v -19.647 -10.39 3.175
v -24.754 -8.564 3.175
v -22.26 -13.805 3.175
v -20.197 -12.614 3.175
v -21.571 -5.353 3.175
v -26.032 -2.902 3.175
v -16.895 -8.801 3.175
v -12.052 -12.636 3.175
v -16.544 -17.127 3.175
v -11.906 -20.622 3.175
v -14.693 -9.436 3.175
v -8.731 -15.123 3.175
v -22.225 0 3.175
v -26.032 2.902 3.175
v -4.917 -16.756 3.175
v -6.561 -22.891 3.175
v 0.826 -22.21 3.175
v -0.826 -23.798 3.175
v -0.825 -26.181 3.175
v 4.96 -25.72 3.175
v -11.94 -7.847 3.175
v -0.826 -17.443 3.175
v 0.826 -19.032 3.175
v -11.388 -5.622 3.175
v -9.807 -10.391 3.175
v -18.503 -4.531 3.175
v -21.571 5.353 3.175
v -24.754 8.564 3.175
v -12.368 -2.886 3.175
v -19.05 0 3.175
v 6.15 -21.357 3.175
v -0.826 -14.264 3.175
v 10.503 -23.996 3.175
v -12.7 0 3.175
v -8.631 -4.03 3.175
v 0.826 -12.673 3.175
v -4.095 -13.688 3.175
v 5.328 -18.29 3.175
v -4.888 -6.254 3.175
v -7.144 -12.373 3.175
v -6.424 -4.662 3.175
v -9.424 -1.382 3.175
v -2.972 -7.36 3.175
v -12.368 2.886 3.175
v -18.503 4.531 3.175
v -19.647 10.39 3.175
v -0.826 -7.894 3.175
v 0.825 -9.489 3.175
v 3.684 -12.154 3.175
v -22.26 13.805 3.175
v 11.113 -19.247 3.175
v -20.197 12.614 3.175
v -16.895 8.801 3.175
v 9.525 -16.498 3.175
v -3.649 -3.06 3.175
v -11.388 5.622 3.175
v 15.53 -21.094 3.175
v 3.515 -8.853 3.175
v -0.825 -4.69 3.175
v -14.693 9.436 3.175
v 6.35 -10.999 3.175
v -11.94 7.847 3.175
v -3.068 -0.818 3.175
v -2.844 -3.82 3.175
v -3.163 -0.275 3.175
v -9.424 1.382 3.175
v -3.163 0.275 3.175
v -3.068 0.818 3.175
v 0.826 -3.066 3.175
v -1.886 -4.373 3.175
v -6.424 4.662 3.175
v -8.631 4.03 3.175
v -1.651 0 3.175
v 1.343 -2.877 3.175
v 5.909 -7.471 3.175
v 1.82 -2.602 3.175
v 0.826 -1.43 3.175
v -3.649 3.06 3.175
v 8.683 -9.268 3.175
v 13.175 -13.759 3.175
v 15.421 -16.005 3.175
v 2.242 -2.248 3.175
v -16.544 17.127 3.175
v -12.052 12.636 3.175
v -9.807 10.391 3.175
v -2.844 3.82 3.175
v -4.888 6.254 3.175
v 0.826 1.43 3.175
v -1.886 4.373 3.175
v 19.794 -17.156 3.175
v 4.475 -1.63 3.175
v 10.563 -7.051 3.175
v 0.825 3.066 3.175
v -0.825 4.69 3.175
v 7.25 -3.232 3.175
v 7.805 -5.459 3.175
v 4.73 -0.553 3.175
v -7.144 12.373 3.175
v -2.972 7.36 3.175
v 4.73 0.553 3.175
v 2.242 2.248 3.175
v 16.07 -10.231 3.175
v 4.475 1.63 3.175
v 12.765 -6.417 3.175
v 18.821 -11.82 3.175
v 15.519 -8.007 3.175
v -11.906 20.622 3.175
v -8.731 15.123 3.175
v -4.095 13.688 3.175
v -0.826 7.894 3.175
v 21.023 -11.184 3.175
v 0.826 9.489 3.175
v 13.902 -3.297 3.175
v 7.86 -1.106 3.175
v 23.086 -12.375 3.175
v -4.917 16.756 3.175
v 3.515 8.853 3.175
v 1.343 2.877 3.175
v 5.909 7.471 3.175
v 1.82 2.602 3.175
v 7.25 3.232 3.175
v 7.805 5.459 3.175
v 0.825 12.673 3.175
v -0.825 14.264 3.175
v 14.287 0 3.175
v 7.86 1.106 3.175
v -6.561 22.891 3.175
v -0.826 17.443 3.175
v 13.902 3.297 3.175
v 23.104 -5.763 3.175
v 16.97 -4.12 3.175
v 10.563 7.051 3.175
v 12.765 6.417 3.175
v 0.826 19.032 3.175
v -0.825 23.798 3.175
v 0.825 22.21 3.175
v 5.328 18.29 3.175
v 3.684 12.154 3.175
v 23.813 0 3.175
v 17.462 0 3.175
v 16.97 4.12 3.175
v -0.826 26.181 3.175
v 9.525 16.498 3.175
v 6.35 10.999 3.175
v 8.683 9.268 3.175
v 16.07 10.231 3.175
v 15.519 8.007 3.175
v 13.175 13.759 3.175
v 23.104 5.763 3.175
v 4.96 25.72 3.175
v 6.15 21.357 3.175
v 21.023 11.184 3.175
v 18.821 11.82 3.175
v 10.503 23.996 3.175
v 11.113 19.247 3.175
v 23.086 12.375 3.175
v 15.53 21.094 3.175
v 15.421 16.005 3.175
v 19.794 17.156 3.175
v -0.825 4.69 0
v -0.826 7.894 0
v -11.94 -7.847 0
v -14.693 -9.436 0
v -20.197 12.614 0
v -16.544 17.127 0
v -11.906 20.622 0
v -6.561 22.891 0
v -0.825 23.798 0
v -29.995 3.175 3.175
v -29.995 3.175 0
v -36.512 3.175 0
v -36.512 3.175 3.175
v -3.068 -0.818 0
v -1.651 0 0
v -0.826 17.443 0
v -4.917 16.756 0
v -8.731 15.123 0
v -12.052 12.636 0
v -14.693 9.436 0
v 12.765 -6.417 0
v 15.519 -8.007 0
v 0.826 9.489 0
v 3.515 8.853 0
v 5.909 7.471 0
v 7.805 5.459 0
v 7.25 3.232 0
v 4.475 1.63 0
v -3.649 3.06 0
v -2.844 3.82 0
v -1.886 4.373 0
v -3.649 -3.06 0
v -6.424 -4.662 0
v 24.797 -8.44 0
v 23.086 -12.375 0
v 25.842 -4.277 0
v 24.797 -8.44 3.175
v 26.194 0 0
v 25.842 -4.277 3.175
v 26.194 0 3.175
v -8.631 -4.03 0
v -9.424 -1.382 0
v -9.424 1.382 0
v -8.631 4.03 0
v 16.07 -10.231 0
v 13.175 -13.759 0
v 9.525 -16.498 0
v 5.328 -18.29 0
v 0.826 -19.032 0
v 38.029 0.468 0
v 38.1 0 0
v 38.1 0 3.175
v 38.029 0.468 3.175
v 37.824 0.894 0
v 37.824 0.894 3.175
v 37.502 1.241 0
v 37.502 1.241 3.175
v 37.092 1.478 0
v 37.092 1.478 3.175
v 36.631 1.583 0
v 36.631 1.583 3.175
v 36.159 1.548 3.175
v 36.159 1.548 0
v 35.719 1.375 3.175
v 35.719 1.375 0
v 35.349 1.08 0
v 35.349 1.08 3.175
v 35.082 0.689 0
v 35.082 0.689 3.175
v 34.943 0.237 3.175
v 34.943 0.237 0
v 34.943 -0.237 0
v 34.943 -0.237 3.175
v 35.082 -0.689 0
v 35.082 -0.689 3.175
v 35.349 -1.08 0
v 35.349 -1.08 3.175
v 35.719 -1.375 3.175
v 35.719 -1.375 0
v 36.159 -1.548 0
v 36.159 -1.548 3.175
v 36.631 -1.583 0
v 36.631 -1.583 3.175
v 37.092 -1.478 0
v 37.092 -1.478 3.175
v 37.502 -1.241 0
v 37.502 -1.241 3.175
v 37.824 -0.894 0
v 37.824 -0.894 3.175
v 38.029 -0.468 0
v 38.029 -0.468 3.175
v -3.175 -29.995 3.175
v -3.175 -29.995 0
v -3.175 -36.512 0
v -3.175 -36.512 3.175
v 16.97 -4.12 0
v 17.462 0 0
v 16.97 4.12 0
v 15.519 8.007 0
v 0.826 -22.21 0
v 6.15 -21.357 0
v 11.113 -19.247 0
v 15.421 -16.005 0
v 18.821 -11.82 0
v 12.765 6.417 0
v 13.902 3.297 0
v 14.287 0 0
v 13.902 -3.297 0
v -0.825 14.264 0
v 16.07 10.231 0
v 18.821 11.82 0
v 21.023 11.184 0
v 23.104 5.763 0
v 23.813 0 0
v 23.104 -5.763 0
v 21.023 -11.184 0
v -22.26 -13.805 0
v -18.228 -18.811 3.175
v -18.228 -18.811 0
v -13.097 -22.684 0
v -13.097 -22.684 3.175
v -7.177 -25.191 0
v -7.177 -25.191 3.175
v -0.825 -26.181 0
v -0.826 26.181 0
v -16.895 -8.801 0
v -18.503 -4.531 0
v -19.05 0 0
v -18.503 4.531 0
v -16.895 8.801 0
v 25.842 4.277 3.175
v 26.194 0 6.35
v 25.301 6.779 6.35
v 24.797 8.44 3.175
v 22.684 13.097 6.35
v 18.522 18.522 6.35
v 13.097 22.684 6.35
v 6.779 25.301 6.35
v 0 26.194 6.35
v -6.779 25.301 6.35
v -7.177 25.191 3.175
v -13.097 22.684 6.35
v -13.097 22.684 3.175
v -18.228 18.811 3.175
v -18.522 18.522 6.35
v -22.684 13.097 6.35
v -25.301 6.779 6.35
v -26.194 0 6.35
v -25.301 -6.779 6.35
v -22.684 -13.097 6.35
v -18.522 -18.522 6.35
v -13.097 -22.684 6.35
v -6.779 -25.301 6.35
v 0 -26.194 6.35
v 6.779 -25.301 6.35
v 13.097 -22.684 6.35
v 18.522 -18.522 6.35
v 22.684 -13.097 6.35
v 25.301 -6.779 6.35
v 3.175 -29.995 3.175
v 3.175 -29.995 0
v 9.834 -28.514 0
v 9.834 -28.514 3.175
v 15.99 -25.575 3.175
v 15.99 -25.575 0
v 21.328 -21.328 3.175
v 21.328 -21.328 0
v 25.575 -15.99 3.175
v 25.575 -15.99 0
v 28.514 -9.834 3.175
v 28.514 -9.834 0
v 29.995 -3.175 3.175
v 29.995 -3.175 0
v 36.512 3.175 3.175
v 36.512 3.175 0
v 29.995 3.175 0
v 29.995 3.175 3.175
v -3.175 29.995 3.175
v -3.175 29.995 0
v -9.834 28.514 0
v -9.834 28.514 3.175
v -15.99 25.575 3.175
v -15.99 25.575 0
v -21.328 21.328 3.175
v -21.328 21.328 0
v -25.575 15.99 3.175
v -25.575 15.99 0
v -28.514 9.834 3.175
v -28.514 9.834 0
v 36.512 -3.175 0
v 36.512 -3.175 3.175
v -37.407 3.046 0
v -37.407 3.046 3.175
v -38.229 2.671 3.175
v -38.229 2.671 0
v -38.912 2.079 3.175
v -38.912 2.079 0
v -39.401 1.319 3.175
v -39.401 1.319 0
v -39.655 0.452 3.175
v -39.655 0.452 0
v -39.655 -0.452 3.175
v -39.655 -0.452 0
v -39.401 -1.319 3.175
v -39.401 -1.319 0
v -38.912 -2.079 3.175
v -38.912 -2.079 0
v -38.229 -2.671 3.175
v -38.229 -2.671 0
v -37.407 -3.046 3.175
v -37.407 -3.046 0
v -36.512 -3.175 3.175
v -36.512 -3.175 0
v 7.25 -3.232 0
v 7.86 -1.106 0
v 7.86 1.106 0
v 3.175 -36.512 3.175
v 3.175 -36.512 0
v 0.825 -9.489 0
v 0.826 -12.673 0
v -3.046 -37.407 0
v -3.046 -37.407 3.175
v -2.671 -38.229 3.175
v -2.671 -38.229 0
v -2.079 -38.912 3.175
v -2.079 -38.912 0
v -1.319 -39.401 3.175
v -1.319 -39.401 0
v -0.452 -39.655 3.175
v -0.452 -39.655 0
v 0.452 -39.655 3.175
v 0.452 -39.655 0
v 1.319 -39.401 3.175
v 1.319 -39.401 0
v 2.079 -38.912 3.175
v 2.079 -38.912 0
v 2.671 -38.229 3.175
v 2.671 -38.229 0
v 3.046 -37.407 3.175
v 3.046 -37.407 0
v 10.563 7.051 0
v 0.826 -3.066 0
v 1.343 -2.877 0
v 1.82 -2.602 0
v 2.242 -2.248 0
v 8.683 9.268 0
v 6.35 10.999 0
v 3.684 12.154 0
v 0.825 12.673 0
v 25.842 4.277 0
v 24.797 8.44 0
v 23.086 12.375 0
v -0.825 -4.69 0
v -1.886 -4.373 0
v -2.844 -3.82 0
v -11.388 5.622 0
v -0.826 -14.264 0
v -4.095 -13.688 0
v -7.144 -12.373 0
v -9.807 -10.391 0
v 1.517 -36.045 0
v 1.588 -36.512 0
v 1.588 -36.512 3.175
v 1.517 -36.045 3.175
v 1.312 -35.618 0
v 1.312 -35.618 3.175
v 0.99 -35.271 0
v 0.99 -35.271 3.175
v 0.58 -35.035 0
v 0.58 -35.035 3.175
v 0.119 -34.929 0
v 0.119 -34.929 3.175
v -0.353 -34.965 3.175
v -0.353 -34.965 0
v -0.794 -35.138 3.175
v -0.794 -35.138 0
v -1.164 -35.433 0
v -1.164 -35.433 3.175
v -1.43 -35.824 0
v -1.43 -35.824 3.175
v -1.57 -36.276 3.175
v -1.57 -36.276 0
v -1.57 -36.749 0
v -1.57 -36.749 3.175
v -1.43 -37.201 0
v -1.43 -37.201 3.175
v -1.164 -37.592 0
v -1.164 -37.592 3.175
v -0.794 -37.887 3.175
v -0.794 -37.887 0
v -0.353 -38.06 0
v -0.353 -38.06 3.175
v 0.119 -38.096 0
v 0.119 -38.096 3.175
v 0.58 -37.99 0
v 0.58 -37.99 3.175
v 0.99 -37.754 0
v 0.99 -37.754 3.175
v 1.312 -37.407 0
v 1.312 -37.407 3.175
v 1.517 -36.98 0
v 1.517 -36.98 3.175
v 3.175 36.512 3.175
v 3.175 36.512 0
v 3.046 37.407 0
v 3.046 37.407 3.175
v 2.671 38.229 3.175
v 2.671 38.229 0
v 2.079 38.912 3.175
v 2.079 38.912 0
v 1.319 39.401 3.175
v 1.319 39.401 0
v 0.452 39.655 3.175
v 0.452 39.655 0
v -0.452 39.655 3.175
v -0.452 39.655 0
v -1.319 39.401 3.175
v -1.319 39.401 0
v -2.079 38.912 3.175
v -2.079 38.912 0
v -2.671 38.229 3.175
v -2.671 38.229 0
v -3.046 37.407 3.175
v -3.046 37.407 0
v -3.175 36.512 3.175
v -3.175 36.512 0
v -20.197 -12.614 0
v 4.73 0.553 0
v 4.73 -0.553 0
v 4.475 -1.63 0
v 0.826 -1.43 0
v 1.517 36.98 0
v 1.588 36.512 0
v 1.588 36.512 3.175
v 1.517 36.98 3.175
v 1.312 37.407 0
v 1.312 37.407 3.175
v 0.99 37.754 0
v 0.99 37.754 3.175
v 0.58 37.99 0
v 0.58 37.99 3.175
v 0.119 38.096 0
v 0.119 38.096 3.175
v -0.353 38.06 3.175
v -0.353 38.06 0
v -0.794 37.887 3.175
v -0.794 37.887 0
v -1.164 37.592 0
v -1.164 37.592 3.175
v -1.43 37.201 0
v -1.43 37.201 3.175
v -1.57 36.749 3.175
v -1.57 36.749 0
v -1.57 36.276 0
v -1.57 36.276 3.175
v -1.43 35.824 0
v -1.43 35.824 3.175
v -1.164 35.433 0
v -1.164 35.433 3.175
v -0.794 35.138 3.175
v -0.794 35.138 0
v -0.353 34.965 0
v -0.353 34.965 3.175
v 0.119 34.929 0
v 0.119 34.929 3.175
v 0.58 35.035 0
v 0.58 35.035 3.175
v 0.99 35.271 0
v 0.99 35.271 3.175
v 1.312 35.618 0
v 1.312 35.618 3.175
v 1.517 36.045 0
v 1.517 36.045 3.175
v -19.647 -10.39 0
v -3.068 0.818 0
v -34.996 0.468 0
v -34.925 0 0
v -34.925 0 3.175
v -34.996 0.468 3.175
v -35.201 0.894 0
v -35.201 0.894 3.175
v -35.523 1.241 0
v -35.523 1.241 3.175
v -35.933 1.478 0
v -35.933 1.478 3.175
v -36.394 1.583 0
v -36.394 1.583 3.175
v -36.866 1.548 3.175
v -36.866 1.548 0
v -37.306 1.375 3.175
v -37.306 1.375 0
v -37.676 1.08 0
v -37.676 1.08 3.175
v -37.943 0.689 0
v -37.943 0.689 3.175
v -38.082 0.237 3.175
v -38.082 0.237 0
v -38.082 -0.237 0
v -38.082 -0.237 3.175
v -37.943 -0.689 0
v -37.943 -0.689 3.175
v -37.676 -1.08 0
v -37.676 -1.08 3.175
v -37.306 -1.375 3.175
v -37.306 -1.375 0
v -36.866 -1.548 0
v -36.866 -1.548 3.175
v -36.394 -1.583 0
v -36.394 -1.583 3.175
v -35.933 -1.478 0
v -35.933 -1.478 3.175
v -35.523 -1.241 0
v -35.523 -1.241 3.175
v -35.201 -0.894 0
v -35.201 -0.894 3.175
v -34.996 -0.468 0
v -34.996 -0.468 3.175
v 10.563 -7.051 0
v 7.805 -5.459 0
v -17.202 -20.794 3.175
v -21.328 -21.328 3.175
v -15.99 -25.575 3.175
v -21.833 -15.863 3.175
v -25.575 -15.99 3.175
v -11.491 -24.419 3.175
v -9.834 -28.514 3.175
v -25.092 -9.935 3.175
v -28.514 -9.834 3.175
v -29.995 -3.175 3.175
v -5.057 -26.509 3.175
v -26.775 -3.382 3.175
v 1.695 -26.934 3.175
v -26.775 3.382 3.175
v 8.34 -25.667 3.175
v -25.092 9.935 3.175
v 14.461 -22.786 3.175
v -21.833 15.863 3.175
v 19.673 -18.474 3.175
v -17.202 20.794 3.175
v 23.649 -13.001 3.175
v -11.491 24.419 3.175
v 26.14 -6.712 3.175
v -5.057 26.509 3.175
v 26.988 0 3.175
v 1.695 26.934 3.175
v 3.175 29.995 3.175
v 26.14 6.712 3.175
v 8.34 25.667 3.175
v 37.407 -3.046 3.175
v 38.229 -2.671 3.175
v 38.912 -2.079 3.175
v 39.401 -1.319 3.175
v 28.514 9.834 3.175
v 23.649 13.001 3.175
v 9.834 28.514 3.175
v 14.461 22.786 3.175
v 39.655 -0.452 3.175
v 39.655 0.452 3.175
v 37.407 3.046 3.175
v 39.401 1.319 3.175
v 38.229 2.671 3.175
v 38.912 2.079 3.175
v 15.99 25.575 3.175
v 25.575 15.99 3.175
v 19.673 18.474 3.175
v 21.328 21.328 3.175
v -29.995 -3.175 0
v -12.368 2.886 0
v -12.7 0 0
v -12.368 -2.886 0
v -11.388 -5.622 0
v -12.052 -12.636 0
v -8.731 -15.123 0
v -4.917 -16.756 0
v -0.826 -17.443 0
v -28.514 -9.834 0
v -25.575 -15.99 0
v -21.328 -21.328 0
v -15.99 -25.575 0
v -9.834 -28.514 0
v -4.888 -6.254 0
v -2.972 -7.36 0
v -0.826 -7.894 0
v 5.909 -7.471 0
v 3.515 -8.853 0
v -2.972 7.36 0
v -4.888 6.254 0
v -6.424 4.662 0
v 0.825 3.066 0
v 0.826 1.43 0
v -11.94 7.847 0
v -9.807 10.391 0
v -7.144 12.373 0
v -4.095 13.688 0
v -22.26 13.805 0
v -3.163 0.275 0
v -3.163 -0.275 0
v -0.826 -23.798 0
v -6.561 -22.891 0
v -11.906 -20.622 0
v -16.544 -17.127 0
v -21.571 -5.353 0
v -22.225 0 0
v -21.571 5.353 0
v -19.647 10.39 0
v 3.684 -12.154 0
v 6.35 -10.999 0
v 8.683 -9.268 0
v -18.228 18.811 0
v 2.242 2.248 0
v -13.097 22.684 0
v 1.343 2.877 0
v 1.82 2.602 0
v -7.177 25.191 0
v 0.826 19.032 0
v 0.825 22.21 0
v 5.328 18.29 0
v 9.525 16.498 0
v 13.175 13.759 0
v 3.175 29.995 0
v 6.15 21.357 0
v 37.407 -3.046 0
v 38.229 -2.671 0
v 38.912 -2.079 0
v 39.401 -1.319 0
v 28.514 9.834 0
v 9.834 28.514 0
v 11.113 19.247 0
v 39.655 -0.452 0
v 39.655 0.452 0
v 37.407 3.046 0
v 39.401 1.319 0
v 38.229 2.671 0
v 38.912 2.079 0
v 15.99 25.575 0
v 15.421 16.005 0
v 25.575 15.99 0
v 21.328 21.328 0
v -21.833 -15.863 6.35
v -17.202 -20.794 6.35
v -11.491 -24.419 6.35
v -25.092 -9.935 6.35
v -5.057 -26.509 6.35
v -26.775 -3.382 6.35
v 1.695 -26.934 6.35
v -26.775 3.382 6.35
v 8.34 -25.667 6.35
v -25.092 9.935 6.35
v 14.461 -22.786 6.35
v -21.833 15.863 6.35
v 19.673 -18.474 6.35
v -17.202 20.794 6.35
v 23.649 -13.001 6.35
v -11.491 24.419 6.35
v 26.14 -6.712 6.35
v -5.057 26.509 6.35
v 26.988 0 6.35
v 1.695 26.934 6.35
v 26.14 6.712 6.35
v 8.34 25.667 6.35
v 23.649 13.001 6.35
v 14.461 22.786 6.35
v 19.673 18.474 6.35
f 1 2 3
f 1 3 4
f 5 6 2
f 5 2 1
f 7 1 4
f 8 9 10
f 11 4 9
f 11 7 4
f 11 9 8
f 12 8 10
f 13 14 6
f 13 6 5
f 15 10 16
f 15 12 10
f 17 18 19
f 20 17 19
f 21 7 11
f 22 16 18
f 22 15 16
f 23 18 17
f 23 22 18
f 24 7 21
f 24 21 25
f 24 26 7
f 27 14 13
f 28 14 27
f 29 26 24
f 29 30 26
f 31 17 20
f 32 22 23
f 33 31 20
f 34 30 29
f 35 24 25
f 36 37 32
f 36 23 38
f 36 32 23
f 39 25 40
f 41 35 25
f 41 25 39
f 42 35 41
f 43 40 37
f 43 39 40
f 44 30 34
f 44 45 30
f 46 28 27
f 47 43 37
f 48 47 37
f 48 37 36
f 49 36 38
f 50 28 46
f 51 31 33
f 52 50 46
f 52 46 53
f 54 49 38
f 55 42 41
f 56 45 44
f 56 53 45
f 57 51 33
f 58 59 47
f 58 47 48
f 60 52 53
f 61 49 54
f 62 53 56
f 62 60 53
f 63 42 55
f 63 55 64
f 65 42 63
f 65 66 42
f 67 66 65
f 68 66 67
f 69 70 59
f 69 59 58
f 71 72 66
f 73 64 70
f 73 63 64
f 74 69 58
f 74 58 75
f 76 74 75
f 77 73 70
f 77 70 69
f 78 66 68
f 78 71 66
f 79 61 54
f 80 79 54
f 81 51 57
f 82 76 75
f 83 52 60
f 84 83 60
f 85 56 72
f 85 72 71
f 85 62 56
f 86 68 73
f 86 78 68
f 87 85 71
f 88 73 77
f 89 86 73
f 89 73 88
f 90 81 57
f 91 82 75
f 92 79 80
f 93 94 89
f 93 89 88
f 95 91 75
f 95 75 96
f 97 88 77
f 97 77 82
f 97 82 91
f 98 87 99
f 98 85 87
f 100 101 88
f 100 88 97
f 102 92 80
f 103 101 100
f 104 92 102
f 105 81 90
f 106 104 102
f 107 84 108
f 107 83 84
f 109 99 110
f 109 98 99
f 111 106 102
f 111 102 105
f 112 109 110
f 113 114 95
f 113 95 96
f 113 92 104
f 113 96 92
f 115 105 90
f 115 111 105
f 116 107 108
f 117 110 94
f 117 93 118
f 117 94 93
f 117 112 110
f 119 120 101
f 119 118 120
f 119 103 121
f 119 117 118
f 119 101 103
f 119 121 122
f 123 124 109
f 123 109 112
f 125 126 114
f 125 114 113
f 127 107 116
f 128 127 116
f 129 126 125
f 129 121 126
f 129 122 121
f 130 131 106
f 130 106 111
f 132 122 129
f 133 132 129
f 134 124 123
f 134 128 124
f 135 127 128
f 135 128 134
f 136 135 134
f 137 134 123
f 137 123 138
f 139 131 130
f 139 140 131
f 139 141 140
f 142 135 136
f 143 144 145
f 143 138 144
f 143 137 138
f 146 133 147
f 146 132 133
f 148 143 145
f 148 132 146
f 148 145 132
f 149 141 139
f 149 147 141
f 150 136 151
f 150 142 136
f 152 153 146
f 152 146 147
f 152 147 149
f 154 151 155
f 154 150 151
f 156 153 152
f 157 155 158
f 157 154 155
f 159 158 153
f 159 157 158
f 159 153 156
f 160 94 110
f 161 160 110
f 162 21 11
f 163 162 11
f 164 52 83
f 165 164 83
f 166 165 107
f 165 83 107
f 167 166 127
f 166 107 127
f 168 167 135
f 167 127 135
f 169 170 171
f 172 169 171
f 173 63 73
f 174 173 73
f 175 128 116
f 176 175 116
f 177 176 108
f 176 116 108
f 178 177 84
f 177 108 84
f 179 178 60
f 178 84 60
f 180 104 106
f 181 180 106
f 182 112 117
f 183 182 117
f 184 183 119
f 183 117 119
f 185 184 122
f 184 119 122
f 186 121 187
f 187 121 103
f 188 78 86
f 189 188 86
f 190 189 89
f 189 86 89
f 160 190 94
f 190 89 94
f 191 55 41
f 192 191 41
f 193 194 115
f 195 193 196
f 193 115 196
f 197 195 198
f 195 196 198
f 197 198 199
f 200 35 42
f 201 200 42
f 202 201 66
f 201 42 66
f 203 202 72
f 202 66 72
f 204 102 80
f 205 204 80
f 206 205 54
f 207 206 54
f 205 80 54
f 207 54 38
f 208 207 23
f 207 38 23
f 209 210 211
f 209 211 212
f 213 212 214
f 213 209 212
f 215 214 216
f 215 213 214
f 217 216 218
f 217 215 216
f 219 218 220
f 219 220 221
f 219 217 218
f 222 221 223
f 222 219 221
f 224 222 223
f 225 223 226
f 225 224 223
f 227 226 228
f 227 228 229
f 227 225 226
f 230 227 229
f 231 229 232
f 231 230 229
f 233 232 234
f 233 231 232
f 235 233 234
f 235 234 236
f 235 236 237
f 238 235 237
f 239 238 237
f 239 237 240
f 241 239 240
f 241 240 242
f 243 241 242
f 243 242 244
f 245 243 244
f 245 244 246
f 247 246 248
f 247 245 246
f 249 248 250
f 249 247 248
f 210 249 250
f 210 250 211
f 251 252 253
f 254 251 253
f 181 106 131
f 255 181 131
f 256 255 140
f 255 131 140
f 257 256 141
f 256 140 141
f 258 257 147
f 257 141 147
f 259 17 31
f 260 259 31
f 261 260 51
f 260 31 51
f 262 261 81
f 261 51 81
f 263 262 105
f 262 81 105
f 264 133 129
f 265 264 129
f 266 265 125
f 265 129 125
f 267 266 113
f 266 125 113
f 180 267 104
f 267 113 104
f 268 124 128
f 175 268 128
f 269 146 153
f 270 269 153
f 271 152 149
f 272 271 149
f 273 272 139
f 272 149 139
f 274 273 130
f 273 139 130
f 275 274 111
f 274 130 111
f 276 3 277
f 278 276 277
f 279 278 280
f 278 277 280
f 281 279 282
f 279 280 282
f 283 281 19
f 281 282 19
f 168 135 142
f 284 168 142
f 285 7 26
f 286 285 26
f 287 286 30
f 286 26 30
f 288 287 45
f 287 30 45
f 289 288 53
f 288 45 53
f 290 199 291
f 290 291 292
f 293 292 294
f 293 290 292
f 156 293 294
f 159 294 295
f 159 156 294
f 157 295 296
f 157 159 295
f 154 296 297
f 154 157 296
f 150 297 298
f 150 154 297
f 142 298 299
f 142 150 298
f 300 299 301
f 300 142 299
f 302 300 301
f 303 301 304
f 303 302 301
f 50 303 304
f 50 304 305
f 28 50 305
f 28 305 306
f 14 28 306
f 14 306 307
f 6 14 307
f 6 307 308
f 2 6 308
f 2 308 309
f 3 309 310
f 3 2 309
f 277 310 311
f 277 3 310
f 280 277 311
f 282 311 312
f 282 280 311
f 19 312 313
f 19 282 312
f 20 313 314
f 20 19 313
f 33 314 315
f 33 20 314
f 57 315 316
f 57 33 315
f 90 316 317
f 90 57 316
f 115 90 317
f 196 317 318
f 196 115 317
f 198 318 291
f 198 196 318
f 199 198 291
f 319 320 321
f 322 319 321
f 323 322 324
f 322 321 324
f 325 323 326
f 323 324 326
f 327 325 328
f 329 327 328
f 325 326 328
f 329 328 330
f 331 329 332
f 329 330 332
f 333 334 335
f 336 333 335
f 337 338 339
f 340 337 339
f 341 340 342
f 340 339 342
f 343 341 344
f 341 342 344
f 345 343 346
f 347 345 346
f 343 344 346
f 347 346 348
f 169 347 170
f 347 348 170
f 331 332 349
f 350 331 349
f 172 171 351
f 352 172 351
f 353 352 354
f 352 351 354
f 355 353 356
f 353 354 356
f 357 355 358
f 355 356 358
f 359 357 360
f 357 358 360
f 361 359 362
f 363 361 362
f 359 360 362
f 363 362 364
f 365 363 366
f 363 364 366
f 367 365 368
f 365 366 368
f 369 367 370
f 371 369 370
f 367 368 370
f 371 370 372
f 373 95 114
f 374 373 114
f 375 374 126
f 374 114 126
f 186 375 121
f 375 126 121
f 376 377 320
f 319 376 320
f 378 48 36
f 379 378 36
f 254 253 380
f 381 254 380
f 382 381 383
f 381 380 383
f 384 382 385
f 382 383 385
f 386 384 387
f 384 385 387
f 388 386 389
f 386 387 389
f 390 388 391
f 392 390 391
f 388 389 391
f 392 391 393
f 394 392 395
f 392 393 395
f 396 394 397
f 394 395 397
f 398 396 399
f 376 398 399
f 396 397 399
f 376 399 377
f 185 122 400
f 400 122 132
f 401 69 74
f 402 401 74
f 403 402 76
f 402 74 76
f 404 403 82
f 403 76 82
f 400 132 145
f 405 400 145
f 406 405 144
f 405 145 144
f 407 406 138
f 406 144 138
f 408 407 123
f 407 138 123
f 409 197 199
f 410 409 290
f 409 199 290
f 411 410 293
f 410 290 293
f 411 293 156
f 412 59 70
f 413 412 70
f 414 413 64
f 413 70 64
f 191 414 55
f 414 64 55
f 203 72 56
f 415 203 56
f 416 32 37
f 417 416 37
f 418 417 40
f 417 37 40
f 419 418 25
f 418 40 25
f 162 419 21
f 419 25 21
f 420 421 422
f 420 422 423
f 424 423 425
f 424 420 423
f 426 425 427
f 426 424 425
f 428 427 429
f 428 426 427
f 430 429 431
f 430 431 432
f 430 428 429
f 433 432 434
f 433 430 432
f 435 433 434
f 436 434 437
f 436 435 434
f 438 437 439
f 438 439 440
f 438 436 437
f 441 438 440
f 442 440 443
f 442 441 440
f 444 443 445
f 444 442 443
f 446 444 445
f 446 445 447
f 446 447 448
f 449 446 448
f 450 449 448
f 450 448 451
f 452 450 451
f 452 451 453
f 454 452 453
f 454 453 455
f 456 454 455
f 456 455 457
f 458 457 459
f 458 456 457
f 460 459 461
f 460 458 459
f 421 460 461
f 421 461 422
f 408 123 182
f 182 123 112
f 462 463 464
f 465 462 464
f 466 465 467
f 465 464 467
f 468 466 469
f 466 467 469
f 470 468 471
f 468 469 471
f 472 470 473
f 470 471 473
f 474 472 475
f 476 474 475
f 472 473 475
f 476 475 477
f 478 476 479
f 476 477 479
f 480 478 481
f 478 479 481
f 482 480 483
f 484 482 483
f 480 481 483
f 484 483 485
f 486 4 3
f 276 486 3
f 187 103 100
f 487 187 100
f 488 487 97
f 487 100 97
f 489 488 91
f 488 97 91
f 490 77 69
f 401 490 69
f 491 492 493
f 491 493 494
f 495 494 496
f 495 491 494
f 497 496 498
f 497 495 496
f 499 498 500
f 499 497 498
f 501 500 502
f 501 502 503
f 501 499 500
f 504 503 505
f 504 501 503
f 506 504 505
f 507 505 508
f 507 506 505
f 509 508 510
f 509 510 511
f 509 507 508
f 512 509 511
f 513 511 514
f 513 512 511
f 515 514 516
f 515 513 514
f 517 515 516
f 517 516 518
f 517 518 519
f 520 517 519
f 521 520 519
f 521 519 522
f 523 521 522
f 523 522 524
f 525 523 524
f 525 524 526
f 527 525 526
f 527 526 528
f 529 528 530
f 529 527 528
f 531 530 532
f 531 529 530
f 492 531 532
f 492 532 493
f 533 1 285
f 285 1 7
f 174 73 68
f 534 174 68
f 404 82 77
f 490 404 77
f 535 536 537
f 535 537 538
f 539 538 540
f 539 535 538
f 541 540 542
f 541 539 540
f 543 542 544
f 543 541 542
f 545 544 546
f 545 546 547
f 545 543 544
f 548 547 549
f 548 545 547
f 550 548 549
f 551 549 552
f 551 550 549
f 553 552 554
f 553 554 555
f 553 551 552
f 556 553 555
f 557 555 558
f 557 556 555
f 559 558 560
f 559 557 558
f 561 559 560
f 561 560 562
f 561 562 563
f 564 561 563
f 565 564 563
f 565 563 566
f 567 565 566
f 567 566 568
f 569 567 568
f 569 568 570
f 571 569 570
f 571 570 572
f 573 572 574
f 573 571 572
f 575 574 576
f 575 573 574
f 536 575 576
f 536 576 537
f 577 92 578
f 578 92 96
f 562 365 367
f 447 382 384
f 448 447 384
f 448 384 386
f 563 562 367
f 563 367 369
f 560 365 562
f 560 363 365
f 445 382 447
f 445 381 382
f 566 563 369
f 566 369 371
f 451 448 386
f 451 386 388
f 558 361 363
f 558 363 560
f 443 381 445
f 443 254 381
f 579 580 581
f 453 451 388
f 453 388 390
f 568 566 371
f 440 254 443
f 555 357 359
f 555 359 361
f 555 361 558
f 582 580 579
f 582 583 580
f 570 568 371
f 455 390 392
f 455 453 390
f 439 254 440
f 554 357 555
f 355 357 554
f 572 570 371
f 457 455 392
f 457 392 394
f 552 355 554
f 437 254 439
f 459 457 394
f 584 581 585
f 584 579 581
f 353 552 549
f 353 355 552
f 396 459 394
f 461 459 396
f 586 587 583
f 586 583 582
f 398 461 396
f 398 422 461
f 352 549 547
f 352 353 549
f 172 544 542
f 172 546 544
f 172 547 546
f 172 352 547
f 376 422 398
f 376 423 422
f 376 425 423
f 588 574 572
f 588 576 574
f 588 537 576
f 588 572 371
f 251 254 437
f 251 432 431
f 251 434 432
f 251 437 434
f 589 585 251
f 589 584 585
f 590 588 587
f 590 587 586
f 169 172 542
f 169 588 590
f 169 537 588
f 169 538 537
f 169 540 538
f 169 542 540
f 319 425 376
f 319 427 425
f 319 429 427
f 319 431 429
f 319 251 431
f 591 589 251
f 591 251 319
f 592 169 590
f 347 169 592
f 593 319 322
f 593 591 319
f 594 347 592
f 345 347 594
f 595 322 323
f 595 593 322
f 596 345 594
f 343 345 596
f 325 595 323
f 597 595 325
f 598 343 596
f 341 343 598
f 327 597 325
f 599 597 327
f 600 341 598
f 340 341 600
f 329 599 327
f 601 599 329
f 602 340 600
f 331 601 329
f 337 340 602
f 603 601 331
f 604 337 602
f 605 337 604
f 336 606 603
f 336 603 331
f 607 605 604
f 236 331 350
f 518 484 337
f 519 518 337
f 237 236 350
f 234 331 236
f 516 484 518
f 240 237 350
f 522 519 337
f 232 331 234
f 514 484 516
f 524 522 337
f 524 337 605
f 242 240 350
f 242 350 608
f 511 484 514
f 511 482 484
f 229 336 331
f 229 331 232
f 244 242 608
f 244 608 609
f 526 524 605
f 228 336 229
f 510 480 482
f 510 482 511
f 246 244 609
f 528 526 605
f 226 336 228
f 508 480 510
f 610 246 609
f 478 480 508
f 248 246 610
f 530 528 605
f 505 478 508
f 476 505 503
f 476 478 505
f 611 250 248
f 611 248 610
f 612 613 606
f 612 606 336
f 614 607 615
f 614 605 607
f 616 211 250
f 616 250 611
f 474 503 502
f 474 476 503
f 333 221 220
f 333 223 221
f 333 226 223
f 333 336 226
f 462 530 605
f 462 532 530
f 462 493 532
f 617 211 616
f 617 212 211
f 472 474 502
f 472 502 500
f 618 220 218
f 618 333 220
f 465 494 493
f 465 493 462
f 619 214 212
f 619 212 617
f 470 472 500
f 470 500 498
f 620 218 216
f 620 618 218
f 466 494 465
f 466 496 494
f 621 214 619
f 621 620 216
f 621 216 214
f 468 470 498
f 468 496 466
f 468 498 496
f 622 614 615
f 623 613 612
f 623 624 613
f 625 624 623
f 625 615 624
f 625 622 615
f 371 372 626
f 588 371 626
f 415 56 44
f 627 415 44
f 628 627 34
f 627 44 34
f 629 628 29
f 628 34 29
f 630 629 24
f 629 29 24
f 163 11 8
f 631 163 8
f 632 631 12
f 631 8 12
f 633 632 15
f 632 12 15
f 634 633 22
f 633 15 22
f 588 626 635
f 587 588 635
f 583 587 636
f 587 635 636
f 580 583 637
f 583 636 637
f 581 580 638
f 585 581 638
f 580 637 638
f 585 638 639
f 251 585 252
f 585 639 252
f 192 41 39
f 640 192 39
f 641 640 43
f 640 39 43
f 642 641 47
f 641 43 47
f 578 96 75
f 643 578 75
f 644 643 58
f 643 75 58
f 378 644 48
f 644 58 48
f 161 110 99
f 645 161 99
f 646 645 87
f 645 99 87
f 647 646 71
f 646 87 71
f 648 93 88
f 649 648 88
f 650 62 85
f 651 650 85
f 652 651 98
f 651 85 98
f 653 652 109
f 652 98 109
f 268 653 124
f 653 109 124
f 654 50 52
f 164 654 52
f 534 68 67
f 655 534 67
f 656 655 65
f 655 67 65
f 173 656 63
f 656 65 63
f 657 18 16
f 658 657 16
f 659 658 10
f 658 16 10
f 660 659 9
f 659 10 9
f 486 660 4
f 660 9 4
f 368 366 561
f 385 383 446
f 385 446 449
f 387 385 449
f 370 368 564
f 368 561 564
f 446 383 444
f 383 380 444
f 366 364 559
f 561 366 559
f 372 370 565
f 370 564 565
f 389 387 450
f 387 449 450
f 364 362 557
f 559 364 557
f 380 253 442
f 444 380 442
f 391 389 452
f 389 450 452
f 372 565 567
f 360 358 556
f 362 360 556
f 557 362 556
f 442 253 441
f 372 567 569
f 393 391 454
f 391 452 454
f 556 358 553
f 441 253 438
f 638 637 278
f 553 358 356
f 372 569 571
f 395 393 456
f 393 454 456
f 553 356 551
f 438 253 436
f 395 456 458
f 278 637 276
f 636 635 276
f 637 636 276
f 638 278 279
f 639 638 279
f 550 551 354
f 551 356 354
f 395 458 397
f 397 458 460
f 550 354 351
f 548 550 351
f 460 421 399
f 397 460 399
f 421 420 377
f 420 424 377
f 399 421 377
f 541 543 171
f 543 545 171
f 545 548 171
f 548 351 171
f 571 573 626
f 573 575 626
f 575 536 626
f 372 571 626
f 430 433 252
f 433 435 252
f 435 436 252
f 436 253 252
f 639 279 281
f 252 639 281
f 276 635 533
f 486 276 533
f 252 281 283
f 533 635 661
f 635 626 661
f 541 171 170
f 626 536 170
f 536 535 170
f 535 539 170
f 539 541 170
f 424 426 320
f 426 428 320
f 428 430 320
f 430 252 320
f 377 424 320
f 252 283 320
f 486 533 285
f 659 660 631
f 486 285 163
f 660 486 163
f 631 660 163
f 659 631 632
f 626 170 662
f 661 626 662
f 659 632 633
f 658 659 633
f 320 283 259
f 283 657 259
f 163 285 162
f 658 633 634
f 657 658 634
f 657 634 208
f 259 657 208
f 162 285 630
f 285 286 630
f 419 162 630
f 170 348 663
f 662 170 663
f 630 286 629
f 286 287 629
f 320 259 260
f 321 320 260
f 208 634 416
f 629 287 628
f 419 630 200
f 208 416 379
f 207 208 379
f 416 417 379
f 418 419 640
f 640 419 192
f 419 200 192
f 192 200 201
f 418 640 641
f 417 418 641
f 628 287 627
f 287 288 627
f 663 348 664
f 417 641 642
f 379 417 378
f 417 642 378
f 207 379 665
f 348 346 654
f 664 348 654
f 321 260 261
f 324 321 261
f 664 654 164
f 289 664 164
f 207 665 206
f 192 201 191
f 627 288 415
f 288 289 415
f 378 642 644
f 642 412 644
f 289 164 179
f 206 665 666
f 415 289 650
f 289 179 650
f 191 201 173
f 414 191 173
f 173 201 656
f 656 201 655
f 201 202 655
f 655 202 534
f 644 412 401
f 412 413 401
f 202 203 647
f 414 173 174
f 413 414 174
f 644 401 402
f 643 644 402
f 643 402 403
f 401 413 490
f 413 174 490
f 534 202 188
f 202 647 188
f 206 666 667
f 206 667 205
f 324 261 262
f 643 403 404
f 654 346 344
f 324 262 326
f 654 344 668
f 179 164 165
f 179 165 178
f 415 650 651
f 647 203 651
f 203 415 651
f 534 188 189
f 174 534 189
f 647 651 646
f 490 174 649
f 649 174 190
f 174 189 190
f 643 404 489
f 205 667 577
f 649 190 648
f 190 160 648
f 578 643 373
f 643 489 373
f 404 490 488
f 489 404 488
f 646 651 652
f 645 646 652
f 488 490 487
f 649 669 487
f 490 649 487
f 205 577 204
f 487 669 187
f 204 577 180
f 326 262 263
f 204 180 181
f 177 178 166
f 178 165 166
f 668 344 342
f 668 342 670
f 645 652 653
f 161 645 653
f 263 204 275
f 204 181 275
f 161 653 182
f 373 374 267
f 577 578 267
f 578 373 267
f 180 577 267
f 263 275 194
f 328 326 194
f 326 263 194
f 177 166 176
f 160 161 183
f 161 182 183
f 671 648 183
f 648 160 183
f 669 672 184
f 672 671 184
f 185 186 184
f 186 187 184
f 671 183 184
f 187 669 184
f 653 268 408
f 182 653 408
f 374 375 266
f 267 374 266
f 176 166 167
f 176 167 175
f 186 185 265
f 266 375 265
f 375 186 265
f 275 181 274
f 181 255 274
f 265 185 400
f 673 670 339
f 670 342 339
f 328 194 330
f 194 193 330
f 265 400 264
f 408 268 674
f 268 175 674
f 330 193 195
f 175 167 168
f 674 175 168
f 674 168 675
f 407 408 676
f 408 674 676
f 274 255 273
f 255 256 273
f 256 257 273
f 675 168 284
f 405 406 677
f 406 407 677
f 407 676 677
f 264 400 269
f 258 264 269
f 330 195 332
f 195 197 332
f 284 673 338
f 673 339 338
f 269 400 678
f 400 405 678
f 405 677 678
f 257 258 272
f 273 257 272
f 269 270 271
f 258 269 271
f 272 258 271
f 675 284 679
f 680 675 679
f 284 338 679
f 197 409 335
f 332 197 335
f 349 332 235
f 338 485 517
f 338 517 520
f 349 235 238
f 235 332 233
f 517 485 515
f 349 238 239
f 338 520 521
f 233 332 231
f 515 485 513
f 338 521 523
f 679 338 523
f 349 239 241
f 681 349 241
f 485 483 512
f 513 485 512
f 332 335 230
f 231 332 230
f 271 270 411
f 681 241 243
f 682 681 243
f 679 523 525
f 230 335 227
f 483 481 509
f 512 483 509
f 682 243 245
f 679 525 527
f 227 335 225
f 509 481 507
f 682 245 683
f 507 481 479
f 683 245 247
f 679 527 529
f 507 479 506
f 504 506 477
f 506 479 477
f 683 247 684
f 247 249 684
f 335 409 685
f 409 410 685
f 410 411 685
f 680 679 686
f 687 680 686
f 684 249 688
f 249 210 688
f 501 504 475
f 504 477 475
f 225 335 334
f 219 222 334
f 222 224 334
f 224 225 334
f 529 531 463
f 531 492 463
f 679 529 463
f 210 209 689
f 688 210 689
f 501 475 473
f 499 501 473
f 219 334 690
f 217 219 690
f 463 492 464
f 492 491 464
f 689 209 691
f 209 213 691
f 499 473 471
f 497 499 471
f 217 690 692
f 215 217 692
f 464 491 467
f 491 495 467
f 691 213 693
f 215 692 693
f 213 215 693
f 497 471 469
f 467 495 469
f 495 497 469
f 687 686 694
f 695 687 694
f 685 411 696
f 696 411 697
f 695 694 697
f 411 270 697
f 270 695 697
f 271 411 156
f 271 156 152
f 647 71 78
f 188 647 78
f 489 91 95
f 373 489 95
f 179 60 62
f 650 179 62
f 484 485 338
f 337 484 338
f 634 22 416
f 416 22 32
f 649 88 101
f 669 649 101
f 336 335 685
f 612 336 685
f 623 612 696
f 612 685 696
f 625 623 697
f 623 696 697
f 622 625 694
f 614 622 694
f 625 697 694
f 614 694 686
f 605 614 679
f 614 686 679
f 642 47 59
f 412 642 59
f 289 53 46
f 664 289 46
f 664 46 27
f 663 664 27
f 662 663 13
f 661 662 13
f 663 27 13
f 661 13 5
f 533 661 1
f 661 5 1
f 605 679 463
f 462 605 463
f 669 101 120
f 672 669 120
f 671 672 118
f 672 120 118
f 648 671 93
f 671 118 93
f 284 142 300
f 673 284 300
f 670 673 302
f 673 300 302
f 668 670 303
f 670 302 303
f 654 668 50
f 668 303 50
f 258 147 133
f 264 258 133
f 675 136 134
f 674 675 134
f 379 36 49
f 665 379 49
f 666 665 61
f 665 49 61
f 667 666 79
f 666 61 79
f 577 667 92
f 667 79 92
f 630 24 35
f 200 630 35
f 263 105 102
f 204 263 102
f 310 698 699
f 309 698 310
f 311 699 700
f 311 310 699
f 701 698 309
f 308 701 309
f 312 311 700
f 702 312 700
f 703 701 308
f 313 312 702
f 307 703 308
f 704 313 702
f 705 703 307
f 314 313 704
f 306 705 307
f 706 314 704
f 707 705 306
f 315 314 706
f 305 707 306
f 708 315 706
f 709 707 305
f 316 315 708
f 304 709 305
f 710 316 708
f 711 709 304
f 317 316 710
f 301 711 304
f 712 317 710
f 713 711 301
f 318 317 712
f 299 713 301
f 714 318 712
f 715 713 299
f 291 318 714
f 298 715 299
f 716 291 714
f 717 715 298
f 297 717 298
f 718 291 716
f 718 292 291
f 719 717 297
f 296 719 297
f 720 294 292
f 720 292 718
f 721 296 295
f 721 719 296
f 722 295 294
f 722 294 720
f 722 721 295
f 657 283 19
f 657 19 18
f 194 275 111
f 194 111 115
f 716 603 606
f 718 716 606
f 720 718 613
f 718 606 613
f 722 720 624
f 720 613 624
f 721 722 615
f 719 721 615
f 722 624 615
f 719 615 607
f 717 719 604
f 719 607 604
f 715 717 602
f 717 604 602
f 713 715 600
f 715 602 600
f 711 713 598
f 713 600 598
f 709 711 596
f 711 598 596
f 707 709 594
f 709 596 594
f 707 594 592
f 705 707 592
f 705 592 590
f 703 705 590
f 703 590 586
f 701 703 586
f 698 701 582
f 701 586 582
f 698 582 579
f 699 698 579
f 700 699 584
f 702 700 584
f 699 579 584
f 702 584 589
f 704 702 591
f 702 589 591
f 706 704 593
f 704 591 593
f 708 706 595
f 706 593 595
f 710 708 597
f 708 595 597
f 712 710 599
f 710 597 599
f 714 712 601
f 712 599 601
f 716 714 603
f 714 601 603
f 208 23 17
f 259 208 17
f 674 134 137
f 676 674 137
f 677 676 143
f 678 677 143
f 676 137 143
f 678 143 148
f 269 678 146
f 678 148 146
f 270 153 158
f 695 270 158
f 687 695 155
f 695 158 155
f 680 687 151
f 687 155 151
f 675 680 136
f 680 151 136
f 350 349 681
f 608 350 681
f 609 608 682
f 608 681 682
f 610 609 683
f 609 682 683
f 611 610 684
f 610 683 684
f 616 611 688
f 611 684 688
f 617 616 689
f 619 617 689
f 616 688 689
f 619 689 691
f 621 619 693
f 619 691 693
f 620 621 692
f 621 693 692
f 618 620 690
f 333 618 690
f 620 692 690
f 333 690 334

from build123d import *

# Parameters (mm, degrees)
F0_R     = 1.5875
F1_DEPTH = 3.175
F2_R     = 26.9875
F2_R_2   = 26.19375
F3_DEPTH = 3.175
F5_DEPTH = 3.175


# Not quite as in the source:
# - after a boolean that leaves OpenCascade's solid faulty, fix() repairs it


with BuildPart() as f1:
    # F0 (on Top) → F1 (new body)
    with BuildSketch(Plane.XY):
        with BuildLine():
            Line((36.5125, 3.175), (29.994929259, 3.175))
            ThreePointArc((29.994929259, 3.175), (21.3281082875, 21.3281082875), (3.175, 29.994929259))
            Line((3.175, 29.994929259), (3.175, 36.5125))
            ThreePointArc((3.175, 36.5125), (0, 39.6875), (-3.175, 36.5125))
            Line((-3.175, 36.5125), (-3.175, 29.994929259))
            ThreePointArc((-3.175, 29.994929259), (-21.3281082875, 21.3281082875), (-29.994929259, 3.175))
            Line((-29.994929259, 3.175), (-30.1625, 3.175))
            Line((-30.1625, 3.175), (-36.5125, 3.175))
            ThreePointArc((-36.5125, 3.175), (-39.6875, 0), (-36.5125, -3.175))
            Line((-36.5125, -3.175), (-30.1625, -3.175))
            Line((-30.1625, -3.175), (-29.994929259, -3.175))
            ThreePointArc((-29.994929259, -3.175), (-21.3281082875, -21.3281082875), (-3.175, -29.994929259))
            Line((-3.175, -29.994929259), (-3.175, -36.5125))
            ThreePointArc((-3.175, -36.5125), (0, -39.6875), (3.175, -36.5125))
            Line((3.175, -36.5125), (3.175, -29.994929259))
            ThreePointArc((3.175, -29.994929259), (21.3281082875, -21.3281082875), (29.994929259, -3.175))
            Line((29.994929259, -3.175), (36.5125, -3.175))
            ThreePointArc((36.5125, -3.175), (39.6875, 0), (36.5125, 3.175))
        make_face()
        with Locations((0, -36.5125)):
            Circle(F0_R, mode=Mode.SUBTRACT)
        with Locations((-36.5125, 0)):
            Circle(F0_R, mode=Mode.SUBTRACT)
        with Locations((36.5125, 0)):
            Circle(F0_R, mode=Mode.SUBTRACT)
        with Locations((0, 36.5125)):
            Circle(F0_R, mode=Mode.SUBTRACT)
    extrude(amount=F1_DEPTH)

    # F2 (on face) → F3 (join)
    with BuildSketch(Plane.XY.offset(3.175)):
        Circle(F2_R)
        Circle(F2_R_2, mode=Mode.SUBTRACT)
    extrude(amount=F3_DEPTH)

    # F4 (on face) → F5 (cut)
    with BuildSketch(Plane.XY.offset(3.175)):
        with BuildLine():
            ThreePointArc((-0.8255, 26.1807388897), (-13.096875, 22.6844529204), (-22.2604349684, 13.8052734157))
            Line((-22.2604349684, 13.8052734157), (-20.1970845335, 12.6139974867))
            ThreePointArc((-20.1970845335, 12.6139974867), (-11.90625, 20.6222299276), (-0.8255, 23.7981870318))
            Line((-0.8255, 23.7981870318), (-0.8255, 26.1807388897))
        make_face()
        with BuildLine():
            ThreePointArc((0.8255, 19.0321057624), (9.525, 16.4977839421), (16.0695370777, 10.230956852))
            Line((16.0695370777, 10.230956852), (18.8213832288, 11.8197359681))
            ThreePointArc((18.8213832288, 11.8197359681), (11.1125, 19.2474145991), (0.8255, 22.2096639945))
            Line((0.8255, 22.2096639945), (0.8255, 19.0321057624))
        make_face()
        with BuildLine():
            Line((21.0225845335, -11.1841895451), (23.0859349684, -12.375465474))
            ThreePointArc((23.0859349684, -12.375465474), (25.4049183047, -6.3798640262), (26.19375, 0))
            ThreePointArc((26.19375, 0), (25.4049183047, 6.3798640262), (23.0859349684, 12.375465474))
            Line((23.0859349684, 12.375465474), (21.0225845335, 11.1841895451))
            ThreePointArc((21.0225845335, 11.1841895451), (23.8125, 0), (21.0225845335, -11.1841895451))
        make_face()
        with BuildLine():
            Line((12.7654179102, -6.4169121723), (15.5188114324, -8.0065846636))
            ThreePointArc((15.5188114324, -8.0065846636), (17.4625, 0), (15.5188114324, 8.0065846636))
            Line((15.5188114324, 8.0065846636), (12.7654179102, 6.4169121723))
            ThreePointArc((12.7654179102, 6.4169121723), (14.2875, 0), (12.7654179102, -6.4169121723))
        make_face()
        with BuildLine():
            Line((4.4747651403, -1.6303015639), (7.2495505675, -3.2323246772))
            ThreePointArc((7.2495505675, -3.2323246772), (7.9375, 0), (7.2495505675, 3.2323246772))
            Line((7.2495505675, 3.2323246772), (4.4747651403, 1.6303015639))
            ThreePointArc((4.4747651403, 1.6303015639), (4.7625, 0), (4.4747651403, -1.6303015639))
        make_face()
        with BuildLine():
            ThreePointArc((0.8255, 9.4891609086), (4.7625, 8.248891971), (7.8051044075, 5.4594844251))
            Line((7.8051044075, 5.4594844251), (10.5625136557, 7.0514753969))
            ThreePointArc((10.5625136557, 7.0514753969), (6.35, 10.9985226281), (0.8255, 12.6731428521))
            Line((0.8255, 12.6731428521), (0.8255, 9.4891609086))
        make_face()
        with BuildLine():
            ThreePointArc((-11.9399179102, 7.846720114), (-7.14375, 12.3733379566), (-0.8255, 14.2636322863))
            Line((-0.8255, 14.2636322863), (-0.8255, 17.4429772688))
            ThreePointArc((-0.8255, 17.4429772688), (-8.73125, 15.1229686136), (-14.6933114324, 9.4363926052))
            Line((-14.6933114324, 9.4363926052), (-11.9399179102, 7.846720114))
        make_face()
        with BuildLine():
            ThreePointArc((-16.8950370777, -8.8011489104), (-19.05, 0), (-16.8950370777, 8.8011489104))
            Line((-16.8950370777, 8.8011489104), (-19.6468832288, 10.3899280264))
            ThreePointArc((-19.6468832288, 10.3899280264), (-22.225, 0), (-19.6468832288, -10.3899280264))
            Line((-19.6468832288, -10.3899280264), (-16.8950370777, -8.8011489104))
        make_face()
        with BuildLine():
            ThreePointArc((-8.6306044075, -4.0296764835), (-9.525, 0), (-8.6306044075, 4.0296764835))
            Line((-8.6306044075, 4.0296764835), (-11.3880136557, 5.6216674552))
            ThreePointArc((-11.3880136557, 5.6216674552), (-12.7, 0), (-11.3880136557, -5.6216674552))
            Line((-11.3880136557, -5.6216674552), (-8.6306044075, -4.0296764835))
        make_face()
        with BuildLine():
            ThreePointArc((-0.8255, -14.2636322863), (-7.14375, -12.3733379566), (-11.9399179102, -7.846720114))
            Line((-11.9399179102, -7.846720114), (-14.6933114324, -9.4363926052))
            ThreePointArc((-14.6933114324, -9.4363926052), (-8.73125, -15.1229686136), (-0.8255, -17.4429772688))
            Line((-0.8255, -17.4429772688), (-0.8255, -14.2636322863))
        make_face()
        with BuildLine():
            ThreePointArc((-22.2604349684, -13.8052734157), (-13.096875, -22.6844529204), (-0.8255, -26.1807388897))
            Line((-0.8255, -26.1807388897), (-0.8255, -23.7981870318))
            ThreePointArc((-0.8255, -23.7981870318), (-11.90625, -20.6222299276), (-20.1970845335, -12.6139974867))
            Line((-20.1970845335, -12.6139974867), (-22.2604349684, -13.8052734157))
        make_face()
        with BuildLine():
            ThreePointArc((16.0695370777, -10.230956852), (9.525, -16.4977839421), (0.8255, -19.0321057624))
            Line((0.8255, -19.0321057624), (0.8255, -22.2096639945))
            ThreePointArc((0.8255, -22.2096639945), (11.1125, -19.2474145991), (18.8213832288, -11.8197359681))
            Line((18.8213832288, -11.8197359681), (16.0695370777, -10.230956852))
        make_face()
        with BuildLine():
            ThreePointArc((7.8051044075, -5.4594844251), (4.7625, -8.248891971), (0.8255, -9.4891609086))
            Line((0.8255, -9.4891609086), (0.8255, -12.6731428521))
            ThreePointArc((0.8255, -12.6731428521), (6.35, -10.9985226281), (10.5625136557, -7.0514753969))
            Line((10.5625136557, -7.0514753969), (7.8051044075, -5.4594844251))
        make_face()
        with BuildLine():
            ThreePointArc((-0.8255, -4.6904110694), (-2.38125, -4.1244459855), (-3.6492651403, -3.0601095055))
            Line((-3.6492651403, -3.0601095055), (-6.4240505675, -4.6621326189))
            ThreePointArc((-6.4240505675, -4.6621326189), (-3.96875, -6.8740766425), (-0.8255, -7.8944572961))
            Line((-0.8255, -7.8944572961), (-0.8255, -4.6904110694))
        make_face()
        with BuildLine():
            ThreePointArc((-3.6492651403, 3.0601095055), (-2.38125, 4.1244459855), (-0.8255, 4.6904110694))
            Line((-0.8255, 4.6904110694), (-0.8255, 7.8944572961))
            ThreePointArc((-0.8255, 7.8944572961), (-3.96875, 6.8740766425), (-6.4240505675, 4.6621326189))
            Line((-6.4240505675, 4.6621326189), (-3.6492651403, 3.0601095055))
        make_face()
        with BuildLine():
            Line((0.8255, 1.4298079416), (2.2423170542, 2.2478076493))
            ThreePointArc((2.2423170542, 2.2478076493), (1.5875, 2.749630657), (0.8255, 3.065807357))
            Line((0.8255, 3.065807357), (0.8255, 1.4298079416))
        make_face()
        with BuildLine():
            Line((0.8255, -1.4298079416), (0.8255, -3.065807357))
            ThreePointArc((0.8255, -3.065807357), (1.5875, -2.749630657), (2.2423170542, -2.2478076493))
            Line((2.2423170542, -2.2478076493), (0.8255, -1.4298079416))
        make_face()
        with BuildLine():
            Line((-1.651, 0), (-3.0678170542, 0.8179997077))
            ThreePointArc((-3.0678170542, 0.8179997077), (-3.175, 0), (-3.0678170542, -0.8179997077))
            Line((-3.0678170542, -0.8179997077), (-1.651, 0))
        make_face()
    extrude(amount=-F5_DEPTH, mode=Mode.SUBTRACT)

    add(f1.part.fix(), mode=Mode.REPLACE)


solid = f1.part
